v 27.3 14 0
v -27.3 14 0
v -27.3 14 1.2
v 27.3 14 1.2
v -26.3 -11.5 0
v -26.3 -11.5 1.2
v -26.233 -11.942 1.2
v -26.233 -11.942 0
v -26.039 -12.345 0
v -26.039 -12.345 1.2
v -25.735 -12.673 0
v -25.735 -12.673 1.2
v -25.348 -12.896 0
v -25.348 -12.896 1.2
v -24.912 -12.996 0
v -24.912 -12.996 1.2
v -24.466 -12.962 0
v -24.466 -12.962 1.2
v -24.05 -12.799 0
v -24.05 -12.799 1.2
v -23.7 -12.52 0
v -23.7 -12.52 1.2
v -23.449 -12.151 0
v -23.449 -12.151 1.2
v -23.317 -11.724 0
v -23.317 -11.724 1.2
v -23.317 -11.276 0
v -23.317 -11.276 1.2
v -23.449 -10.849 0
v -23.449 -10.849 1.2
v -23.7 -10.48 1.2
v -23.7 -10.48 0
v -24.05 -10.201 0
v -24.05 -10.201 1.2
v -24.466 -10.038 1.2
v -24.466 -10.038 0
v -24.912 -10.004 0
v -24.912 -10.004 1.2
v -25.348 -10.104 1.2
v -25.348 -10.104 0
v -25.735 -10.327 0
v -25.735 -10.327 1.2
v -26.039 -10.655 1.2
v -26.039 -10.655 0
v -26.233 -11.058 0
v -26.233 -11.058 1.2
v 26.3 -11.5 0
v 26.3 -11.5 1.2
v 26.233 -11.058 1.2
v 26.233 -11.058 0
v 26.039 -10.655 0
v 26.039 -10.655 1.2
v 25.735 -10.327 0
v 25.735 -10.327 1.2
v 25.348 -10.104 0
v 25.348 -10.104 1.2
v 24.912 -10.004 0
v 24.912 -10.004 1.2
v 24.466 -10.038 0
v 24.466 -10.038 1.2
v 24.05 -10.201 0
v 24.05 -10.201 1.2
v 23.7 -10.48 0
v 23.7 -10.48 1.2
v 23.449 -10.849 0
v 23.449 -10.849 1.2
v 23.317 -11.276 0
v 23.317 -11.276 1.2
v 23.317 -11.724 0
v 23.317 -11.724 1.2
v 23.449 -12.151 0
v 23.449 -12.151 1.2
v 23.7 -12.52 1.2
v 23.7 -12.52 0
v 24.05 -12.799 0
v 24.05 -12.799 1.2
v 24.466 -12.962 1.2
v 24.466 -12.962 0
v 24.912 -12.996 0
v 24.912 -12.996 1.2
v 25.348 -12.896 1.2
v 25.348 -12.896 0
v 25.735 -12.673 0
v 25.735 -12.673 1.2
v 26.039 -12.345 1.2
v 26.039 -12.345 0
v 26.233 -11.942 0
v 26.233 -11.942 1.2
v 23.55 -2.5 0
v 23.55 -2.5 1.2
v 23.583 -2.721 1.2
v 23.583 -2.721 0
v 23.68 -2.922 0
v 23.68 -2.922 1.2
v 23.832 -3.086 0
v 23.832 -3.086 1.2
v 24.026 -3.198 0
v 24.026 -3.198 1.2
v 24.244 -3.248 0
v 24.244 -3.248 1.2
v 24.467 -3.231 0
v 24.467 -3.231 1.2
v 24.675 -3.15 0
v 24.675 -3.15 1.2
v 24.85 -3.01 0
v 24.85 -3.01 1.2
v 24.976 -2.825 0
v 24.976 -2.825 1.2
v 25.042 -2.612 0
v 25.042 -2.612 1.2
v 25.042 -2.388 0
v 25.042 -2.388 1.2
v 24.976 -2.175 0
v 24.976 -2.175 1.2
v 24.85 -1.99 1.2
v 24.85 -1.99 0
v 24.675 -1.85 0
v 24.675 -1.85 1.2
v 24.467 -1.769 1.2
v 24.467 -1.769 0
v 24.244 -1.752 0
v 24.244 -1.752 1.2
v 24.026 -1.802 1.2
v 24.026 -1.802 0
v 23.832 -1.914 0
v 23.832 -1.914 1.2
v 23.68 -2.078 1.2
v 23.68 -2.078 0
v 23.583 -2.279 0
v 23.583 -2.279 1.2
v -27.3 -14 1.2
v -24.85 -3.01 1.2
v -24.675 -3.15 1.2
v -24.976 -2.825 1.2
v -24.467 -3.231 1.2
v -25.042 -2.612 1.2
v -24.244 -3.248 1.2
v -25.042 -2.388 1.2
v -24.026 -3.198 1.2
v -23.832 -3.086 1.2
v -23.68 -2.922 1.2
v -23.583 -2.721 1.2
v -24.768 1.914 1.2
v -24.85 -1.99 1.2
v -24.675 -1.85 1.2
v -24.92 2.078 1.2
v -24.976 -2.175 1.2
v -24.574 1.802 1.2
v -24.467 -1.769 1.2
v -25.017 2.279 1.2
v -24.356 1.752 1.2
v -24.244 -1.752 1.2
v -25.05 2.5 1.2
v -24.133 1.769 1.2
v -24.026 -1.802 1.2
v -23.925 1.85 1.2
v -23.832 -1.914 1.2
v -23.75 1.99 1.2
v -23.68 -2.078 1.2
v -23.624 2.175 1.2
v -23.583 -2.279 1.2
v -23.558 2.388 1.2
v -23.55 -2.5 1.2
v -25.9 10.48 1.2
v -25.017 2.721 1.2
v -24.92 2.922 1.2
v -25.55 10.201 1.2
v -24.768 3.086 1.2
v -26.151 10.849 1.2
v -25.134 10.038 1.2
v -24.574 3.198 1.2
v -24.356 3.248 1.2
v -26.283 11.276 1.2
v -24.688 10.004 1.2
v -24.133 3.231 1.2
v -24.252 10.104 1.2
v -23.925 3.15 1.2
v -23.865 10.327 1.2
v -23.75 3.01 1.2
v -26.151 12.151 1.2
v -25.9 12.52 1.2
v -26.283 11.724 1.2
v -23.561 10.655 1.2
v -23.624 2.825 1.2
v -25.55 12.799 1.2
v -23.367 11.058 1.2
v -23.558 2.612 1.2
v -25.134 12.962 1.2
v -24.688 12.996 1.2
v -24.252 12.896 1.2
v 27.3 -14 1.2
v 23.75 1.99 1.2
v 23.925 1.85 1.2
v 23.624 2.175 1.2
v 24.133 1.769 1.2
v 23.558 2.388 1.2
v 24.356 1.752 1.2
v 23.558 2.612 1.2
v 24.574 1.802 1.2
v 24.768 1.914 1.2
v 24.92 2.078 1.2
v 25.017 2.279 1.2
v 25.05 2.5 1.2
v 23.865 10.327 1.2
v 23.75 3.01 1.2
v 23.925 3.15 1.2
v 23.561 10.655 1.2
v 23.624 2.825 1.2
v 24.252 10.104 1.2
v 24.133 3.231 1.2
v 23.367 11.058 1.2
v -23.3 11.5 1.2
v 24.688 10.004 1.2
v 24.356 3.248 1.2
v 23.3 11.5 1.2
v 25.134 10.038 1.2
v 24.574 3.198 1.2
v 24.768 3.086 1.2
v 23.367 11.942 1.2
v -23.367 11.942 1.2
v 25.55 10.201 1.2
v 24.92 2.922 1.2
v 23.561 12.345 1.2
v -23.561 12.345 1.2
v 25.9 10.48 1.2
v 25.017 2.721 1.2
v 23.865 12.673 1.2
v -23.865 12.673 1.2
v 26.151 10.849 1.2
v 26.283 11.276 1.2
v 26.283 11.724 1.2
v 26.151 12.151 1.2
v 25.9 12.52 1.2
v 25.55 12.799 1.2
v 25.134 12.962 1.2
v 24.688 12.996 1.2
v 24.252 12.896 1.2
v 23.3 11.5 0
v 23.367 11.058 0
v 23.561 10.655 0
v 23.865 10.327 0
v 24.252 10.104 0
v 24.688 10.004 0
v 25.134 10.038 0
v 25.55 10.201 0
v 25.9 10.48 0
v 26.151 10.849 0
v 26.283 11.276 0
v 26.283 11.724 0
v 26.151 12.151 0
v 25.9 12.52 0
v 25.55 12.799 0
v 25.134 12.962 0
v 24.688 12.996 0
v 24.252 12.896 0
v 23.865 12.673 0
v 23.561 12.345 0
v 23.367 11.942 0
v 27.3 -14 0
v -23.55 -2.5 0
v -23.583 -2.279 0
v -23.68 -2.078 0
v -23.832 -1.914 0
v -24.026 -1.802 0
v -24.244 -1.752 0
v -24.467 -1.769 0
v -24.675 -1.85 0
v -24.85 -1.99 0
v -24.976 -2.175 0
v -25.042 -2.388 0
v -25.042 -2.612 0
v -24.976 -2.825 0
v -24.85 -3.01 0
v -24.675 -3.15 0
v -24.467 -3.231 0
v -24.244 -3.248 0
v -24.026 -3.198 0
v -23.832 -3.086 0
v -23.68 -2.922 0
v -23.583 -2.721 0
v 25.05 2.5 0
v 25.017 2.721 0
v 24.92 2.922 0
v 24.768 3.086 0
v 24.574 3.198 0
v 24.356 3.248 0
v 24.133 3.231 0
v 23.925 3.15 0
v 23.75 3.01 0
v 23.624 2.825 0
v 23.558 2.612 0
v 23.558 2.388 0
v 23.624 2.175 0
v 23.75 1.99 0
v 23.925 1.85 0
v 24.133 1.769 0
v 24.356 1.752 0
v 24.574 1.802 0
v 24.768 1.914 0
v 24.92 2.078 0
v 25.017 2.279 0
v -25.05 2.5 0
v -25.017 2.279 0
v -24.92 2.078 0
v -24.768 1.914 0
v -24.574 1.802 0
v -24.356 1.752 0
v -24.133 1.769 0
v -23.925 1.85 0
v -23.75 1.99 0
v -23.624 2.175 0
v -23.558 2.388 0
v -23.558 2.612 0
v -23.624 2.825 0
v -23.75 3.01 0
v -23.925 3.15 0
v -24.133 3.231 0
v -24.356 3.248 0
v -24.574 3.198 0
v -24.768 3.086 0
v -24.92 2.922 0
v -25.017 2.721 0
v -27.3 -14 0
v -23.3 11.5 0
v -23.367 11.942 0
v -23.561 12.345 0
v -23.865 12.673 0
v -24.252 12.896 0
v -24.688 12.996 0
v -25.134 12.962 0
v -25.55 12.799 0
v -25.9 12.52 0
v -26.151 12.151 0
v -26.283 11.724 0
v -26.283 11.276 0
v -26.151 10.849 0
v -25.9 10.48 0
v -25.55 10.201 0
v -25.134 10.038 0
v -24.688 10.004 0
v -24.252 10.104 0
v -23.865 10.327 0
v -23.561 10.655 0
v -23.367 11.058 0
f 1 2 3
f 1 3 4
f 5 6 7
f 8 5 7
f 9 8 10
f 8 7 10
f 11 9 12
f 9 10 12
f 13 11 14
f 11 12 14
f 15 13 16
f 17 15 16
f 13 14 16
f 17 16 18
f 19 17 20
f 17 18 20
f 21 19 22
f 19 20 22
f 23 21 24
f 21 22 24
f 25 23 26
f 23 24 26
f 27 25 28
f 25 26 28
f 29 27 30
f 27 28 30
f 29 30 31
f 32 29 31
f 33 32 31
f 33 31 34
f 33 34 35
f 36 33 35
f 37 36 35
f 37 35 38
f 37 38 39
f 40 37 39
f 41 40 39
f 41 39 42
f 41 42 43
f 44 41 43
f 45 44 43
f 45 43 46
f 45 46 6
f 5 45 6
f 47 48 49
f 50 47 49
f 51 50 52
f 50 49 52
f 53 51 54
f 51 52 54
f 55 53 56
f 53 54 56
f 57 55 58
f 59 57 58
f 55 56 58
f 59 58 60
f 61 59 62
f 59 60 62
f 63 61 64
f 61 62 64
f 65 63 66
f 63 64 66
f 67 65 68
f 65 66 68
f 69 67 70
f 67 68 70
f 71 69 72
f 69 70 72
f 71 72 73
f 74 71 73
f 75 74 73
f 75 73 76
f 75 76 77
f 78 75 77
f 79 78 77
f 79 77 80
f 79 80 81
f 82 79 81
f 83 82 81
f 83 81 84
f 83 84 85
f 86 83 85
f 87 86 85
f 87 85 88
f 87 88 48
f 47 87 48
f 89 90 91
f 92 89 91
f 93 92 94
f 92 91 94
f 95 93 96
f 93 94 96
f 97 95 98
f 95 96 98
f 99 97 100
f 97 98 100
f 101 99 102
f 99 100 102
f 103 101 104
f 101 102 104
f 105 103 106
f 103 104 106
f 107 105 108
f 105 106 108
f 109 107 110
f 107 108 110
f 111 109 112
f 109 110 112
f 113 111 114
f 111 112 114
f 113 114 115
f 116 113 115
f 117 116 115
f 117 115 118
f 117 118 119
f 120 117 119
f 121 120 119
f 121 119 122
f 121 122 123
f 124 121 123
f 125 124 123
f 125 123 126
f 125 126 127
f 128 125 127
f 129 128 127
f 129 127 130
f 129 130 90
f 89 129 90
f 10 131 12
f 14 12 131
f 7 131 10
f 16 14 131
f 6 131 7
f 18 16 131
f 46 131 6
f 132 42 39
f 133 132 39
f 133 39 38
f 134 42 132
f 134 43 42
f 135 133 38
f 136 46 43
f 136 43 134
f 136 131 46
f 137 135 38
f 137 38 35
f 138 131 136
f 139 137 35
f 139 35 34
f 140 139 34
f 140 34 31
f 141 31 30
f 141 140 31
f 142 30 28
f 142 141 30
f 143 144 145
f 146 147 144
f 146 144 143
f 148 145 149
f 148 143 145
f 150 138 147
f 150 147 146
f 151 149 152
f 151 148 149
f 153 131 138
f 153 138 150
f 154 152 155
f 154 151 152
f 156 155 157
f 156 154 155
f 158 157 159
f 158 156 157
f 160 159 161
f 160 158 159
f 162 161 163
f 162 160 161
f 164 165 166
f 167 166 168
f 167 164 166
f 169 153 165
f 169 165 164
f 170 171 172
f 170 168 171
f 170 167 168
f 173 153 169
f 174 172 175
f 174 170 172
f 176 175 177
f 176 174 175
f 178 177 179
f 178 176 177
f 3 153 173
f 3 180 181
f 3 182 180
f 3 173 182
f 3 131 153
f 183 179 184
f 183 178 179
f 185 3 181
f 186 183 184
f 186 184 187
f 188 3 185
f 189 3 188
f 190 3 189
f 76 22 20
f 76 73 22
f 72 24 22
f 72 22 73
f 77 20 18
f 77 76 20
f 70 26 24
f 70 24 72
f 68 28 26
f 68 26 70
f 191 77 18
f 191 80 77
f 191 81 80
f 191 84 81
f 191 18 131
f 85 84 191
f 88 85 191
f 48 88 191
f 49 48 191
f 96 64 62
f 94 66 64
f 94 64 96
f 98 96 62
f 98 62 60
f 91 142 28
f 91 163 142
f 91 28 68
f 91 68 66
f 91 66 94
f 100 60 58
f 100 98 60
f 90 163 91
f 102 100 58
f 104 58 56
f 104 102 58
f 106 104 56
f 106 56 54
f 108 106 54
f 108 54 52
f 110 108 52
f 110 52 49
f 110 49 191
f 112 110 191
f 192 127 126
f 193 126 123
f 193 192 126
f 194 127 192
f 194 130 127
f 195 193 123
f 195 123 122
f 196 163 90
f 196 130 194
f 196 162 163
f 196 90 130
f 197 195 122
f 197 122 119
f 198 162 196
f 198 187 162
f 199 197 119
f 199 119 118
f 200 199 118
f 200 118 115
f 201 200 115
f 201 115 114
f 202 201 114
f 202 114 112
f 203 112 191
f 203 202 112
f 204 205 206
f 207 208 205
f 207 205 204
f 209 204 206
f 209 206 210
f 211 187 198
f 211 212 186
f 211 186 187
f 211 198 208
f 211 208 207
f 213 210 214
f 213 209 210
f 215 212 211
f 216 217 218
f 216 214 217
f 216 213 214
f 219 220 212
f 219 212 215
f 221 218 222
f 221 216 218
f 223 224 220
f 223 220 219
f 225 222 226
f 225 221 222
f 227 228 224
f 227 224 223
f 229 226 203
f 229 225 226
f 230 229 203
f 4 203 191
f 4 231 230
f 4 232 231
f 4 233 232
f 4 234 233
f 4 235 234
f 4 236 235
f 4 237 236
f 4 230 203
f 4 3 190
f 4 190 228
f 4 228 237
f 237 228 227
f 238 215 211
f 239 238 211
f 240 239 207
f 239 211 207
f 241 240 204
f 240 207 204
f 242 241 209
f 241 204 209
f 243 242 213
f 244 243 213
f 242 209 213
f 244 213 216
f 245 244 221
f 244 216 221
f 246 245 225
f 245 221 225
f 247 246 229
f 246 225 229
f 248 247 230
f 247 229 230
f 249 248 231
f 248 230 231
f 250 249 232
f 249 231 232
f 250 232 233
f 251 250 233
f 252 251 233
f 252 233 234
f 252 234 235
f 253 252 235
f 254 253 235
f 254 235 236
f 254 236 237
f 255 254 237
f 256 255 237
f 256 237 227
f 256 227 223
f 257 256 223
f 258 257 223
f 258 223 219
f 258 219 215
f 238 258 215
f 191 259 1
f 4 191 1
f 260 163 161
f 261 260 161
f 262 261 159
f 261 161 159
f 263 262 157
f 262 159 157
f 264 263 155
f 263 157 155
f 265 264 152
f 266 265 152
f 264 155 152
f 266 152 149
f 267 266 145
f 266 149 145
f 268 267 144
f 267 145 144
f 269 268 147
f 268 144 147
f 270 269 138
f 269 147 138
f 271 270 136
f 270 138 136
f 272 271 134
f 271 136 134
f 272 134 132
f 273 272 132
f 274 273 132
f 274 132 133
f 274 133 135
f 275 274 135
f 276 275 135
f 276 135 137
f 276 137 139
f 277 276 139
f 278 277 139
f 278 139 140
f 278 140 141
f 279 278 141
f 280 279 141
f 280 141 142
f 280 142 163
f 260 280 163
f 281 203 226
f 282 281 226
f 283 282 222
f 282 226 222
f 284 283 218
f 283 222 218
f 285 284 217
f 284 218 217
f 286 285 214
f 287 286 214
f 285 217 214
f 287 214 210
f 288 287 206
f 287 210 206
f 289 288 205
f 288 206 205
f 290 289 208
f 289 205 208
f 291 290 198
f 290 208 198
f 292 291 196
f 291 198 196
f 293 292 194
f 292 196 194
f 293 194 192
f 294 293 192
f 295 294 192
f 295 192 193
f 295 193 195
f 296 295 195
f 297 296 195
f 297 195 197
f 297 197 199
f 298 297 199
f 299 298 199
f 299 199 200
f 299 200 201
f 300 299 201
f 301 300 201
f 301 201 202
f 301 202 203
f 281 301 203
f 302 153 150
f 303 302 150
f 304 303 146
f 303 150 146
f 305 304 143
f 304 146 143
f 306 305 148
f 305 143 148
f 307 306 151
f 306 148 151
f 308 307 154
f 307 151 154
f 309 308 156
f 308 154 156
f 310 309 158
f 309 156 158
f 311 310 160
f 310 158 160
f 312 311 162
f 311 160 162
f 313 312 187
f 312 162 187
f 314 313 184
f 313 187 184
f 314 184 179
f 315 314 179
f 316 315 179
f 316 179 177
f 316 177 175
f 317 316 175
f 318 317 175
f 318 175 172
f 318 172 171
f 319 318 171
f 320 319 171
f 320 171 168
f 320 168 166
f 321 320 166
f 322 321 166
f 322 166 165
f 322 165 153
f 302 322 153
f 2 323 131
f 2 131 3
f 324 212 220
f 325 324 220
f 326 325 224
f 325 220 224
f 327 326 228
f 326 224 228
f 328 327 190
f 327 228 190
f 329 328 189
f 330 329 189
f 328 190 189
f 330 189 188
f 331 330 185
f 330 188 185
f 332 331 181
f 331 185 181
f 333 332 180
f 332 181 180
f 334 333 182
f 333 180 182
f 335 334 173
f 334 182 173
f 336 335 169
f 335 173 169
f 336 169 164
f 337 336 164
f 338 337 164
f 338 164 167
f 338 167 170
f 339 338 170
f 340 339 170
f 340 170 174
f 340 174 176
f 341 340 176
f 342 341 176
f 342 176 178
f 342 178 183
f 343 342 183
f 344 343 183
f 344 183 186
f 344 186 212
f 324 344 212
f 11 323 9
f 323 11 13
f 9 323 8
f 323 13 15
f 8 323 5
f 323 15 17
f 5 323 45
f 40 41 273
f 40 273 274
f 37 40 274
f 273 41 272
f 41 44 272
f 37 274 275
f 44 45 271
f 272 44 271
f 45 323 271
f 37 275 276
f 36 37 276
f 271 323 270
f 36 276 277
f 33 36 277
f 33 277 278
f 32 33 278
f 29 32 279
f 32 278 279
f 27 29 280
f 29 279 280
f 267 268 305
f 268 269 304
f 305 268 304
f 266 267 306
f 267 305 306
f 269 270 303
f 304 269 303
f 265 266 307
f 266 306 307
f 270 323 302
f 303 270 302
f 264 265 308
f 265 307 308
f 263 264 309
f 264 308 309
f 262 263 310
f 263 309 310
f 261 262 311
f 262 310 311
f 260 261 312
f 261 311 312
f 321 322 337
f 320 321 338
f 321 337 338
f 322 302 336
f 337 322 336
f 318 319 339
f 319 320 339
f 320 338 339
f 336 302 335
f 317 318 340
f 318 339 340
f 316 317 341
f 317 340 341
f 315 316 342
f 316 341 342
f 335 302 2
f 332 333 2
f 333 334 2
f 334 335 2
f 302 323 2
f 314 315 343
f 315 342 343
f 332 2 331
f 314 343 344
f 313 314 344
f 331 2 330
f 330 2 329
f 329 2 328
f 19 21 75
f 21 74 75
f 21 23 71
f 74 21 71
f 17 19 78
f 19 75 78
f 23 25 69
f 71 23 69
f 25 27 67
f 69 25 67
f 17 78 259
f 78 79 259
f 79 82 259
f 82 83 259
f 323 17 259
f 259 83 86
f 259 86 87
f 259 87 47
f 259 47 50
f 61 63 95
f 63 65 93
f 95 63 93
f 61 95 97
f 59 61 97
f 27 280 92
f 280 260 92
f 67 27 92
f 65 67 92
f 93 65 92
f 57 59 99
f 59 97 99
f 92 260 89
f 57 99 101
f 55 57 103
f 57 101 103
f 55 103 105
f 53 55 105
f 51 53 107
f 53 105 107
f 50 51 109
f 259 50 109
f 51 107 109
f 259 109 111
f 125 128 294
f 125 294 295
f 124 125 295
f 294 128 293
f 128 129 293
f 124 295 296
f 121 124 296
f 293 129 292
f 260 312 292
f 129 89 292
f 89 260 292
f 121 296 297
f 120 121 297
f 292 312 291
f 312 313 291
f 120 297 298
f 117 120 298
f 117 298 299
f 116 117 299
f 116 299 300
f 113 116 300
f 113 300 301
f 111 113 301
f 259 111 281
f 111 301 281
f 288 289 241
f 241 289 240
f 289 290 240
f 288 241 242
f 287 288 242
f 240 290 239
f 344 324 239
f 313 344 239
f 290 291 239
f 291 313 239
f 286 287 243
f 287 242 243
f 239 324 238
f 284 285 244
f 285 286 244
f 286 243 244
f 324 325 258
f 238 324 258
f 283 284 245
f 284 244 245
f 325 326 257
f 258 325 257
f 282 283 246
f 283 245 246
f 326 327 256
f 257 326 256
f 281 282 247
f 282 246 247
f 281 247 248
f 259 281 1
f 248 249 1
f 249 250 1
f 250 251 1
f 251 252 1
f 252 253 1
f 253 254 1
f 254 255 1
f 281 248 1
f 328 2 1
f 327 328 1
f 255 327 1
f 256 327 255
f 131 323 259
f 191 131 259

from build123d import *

# Parameters (mm, degrees)
ESBO_O1_W                = 54.6
ESBO_O1_H                = 28
RESSALTO_EXTRUS_O1_DEPTH = 1.2
ESBO_O2_R                = 1.5
CORTE_EXTRUS_O1_DEPTH    = 31.703908546
ESBO_O3_R                = 0.75
CORTE_EXTRUS_O2_DEPTH    = 31.703908546


with BuildPart() as part:
    # Esboço1 → Ressalto-extrusão1 (new body)
    with BuildSketch(Plane.XY):
        Rectangle(ESBO_O1_W, ESBO_O1_H)
    extrude(amount=RESSALTO_EXTRUS_O1_DEPTH)

    # Esboço2 → Corte-extrusão1 (cut, through all)
    with BuildSketch(Plane.XY.offset(1.2)):
        with Locations((-24.8, 11.5)):
            Circle(ESBO_O2_R)
        with Locations(Location((24.8, 11.5, 0), (0, 0, 180))):
            Circle(ESBO_O2_R)
        with Locations(Location((-24.8, -11.5, 0), (0, 0, 180))):
            Circle(ESBO_O2_R)
        with Locations((24.8, -11.5)):
            Circle(ESBO_O2_R)
    extrude(amount=-CORTE_EXTRUS_O1_DEPTH, mode=Mode.SUBTRACT)

    # Esboço3 → Corte-extrusão2 (cut, through all)
    with BuildSketch(Plane.XY.offset(1.2)):
        with Locations((24.3, 2.5)):
            Circle(ESBO_O3_R)
        with Locations(Location((24.3, -2.5, 0), (0, 0, 180))):
            Circle(ESBO_O3_R)
        with Locations((-24.3, -2.5)):
            Circle(ESBO_O3_R)
        with Locations(Location((-24.3, 2.5, 0), (0, 0, 180))):
            Circle(ESBO_O3_R)
    extrude(amount=-CORTE_EXTRUS_O2_DEPTH, mode=Mode.SUBTRACT)


solid = part.part
